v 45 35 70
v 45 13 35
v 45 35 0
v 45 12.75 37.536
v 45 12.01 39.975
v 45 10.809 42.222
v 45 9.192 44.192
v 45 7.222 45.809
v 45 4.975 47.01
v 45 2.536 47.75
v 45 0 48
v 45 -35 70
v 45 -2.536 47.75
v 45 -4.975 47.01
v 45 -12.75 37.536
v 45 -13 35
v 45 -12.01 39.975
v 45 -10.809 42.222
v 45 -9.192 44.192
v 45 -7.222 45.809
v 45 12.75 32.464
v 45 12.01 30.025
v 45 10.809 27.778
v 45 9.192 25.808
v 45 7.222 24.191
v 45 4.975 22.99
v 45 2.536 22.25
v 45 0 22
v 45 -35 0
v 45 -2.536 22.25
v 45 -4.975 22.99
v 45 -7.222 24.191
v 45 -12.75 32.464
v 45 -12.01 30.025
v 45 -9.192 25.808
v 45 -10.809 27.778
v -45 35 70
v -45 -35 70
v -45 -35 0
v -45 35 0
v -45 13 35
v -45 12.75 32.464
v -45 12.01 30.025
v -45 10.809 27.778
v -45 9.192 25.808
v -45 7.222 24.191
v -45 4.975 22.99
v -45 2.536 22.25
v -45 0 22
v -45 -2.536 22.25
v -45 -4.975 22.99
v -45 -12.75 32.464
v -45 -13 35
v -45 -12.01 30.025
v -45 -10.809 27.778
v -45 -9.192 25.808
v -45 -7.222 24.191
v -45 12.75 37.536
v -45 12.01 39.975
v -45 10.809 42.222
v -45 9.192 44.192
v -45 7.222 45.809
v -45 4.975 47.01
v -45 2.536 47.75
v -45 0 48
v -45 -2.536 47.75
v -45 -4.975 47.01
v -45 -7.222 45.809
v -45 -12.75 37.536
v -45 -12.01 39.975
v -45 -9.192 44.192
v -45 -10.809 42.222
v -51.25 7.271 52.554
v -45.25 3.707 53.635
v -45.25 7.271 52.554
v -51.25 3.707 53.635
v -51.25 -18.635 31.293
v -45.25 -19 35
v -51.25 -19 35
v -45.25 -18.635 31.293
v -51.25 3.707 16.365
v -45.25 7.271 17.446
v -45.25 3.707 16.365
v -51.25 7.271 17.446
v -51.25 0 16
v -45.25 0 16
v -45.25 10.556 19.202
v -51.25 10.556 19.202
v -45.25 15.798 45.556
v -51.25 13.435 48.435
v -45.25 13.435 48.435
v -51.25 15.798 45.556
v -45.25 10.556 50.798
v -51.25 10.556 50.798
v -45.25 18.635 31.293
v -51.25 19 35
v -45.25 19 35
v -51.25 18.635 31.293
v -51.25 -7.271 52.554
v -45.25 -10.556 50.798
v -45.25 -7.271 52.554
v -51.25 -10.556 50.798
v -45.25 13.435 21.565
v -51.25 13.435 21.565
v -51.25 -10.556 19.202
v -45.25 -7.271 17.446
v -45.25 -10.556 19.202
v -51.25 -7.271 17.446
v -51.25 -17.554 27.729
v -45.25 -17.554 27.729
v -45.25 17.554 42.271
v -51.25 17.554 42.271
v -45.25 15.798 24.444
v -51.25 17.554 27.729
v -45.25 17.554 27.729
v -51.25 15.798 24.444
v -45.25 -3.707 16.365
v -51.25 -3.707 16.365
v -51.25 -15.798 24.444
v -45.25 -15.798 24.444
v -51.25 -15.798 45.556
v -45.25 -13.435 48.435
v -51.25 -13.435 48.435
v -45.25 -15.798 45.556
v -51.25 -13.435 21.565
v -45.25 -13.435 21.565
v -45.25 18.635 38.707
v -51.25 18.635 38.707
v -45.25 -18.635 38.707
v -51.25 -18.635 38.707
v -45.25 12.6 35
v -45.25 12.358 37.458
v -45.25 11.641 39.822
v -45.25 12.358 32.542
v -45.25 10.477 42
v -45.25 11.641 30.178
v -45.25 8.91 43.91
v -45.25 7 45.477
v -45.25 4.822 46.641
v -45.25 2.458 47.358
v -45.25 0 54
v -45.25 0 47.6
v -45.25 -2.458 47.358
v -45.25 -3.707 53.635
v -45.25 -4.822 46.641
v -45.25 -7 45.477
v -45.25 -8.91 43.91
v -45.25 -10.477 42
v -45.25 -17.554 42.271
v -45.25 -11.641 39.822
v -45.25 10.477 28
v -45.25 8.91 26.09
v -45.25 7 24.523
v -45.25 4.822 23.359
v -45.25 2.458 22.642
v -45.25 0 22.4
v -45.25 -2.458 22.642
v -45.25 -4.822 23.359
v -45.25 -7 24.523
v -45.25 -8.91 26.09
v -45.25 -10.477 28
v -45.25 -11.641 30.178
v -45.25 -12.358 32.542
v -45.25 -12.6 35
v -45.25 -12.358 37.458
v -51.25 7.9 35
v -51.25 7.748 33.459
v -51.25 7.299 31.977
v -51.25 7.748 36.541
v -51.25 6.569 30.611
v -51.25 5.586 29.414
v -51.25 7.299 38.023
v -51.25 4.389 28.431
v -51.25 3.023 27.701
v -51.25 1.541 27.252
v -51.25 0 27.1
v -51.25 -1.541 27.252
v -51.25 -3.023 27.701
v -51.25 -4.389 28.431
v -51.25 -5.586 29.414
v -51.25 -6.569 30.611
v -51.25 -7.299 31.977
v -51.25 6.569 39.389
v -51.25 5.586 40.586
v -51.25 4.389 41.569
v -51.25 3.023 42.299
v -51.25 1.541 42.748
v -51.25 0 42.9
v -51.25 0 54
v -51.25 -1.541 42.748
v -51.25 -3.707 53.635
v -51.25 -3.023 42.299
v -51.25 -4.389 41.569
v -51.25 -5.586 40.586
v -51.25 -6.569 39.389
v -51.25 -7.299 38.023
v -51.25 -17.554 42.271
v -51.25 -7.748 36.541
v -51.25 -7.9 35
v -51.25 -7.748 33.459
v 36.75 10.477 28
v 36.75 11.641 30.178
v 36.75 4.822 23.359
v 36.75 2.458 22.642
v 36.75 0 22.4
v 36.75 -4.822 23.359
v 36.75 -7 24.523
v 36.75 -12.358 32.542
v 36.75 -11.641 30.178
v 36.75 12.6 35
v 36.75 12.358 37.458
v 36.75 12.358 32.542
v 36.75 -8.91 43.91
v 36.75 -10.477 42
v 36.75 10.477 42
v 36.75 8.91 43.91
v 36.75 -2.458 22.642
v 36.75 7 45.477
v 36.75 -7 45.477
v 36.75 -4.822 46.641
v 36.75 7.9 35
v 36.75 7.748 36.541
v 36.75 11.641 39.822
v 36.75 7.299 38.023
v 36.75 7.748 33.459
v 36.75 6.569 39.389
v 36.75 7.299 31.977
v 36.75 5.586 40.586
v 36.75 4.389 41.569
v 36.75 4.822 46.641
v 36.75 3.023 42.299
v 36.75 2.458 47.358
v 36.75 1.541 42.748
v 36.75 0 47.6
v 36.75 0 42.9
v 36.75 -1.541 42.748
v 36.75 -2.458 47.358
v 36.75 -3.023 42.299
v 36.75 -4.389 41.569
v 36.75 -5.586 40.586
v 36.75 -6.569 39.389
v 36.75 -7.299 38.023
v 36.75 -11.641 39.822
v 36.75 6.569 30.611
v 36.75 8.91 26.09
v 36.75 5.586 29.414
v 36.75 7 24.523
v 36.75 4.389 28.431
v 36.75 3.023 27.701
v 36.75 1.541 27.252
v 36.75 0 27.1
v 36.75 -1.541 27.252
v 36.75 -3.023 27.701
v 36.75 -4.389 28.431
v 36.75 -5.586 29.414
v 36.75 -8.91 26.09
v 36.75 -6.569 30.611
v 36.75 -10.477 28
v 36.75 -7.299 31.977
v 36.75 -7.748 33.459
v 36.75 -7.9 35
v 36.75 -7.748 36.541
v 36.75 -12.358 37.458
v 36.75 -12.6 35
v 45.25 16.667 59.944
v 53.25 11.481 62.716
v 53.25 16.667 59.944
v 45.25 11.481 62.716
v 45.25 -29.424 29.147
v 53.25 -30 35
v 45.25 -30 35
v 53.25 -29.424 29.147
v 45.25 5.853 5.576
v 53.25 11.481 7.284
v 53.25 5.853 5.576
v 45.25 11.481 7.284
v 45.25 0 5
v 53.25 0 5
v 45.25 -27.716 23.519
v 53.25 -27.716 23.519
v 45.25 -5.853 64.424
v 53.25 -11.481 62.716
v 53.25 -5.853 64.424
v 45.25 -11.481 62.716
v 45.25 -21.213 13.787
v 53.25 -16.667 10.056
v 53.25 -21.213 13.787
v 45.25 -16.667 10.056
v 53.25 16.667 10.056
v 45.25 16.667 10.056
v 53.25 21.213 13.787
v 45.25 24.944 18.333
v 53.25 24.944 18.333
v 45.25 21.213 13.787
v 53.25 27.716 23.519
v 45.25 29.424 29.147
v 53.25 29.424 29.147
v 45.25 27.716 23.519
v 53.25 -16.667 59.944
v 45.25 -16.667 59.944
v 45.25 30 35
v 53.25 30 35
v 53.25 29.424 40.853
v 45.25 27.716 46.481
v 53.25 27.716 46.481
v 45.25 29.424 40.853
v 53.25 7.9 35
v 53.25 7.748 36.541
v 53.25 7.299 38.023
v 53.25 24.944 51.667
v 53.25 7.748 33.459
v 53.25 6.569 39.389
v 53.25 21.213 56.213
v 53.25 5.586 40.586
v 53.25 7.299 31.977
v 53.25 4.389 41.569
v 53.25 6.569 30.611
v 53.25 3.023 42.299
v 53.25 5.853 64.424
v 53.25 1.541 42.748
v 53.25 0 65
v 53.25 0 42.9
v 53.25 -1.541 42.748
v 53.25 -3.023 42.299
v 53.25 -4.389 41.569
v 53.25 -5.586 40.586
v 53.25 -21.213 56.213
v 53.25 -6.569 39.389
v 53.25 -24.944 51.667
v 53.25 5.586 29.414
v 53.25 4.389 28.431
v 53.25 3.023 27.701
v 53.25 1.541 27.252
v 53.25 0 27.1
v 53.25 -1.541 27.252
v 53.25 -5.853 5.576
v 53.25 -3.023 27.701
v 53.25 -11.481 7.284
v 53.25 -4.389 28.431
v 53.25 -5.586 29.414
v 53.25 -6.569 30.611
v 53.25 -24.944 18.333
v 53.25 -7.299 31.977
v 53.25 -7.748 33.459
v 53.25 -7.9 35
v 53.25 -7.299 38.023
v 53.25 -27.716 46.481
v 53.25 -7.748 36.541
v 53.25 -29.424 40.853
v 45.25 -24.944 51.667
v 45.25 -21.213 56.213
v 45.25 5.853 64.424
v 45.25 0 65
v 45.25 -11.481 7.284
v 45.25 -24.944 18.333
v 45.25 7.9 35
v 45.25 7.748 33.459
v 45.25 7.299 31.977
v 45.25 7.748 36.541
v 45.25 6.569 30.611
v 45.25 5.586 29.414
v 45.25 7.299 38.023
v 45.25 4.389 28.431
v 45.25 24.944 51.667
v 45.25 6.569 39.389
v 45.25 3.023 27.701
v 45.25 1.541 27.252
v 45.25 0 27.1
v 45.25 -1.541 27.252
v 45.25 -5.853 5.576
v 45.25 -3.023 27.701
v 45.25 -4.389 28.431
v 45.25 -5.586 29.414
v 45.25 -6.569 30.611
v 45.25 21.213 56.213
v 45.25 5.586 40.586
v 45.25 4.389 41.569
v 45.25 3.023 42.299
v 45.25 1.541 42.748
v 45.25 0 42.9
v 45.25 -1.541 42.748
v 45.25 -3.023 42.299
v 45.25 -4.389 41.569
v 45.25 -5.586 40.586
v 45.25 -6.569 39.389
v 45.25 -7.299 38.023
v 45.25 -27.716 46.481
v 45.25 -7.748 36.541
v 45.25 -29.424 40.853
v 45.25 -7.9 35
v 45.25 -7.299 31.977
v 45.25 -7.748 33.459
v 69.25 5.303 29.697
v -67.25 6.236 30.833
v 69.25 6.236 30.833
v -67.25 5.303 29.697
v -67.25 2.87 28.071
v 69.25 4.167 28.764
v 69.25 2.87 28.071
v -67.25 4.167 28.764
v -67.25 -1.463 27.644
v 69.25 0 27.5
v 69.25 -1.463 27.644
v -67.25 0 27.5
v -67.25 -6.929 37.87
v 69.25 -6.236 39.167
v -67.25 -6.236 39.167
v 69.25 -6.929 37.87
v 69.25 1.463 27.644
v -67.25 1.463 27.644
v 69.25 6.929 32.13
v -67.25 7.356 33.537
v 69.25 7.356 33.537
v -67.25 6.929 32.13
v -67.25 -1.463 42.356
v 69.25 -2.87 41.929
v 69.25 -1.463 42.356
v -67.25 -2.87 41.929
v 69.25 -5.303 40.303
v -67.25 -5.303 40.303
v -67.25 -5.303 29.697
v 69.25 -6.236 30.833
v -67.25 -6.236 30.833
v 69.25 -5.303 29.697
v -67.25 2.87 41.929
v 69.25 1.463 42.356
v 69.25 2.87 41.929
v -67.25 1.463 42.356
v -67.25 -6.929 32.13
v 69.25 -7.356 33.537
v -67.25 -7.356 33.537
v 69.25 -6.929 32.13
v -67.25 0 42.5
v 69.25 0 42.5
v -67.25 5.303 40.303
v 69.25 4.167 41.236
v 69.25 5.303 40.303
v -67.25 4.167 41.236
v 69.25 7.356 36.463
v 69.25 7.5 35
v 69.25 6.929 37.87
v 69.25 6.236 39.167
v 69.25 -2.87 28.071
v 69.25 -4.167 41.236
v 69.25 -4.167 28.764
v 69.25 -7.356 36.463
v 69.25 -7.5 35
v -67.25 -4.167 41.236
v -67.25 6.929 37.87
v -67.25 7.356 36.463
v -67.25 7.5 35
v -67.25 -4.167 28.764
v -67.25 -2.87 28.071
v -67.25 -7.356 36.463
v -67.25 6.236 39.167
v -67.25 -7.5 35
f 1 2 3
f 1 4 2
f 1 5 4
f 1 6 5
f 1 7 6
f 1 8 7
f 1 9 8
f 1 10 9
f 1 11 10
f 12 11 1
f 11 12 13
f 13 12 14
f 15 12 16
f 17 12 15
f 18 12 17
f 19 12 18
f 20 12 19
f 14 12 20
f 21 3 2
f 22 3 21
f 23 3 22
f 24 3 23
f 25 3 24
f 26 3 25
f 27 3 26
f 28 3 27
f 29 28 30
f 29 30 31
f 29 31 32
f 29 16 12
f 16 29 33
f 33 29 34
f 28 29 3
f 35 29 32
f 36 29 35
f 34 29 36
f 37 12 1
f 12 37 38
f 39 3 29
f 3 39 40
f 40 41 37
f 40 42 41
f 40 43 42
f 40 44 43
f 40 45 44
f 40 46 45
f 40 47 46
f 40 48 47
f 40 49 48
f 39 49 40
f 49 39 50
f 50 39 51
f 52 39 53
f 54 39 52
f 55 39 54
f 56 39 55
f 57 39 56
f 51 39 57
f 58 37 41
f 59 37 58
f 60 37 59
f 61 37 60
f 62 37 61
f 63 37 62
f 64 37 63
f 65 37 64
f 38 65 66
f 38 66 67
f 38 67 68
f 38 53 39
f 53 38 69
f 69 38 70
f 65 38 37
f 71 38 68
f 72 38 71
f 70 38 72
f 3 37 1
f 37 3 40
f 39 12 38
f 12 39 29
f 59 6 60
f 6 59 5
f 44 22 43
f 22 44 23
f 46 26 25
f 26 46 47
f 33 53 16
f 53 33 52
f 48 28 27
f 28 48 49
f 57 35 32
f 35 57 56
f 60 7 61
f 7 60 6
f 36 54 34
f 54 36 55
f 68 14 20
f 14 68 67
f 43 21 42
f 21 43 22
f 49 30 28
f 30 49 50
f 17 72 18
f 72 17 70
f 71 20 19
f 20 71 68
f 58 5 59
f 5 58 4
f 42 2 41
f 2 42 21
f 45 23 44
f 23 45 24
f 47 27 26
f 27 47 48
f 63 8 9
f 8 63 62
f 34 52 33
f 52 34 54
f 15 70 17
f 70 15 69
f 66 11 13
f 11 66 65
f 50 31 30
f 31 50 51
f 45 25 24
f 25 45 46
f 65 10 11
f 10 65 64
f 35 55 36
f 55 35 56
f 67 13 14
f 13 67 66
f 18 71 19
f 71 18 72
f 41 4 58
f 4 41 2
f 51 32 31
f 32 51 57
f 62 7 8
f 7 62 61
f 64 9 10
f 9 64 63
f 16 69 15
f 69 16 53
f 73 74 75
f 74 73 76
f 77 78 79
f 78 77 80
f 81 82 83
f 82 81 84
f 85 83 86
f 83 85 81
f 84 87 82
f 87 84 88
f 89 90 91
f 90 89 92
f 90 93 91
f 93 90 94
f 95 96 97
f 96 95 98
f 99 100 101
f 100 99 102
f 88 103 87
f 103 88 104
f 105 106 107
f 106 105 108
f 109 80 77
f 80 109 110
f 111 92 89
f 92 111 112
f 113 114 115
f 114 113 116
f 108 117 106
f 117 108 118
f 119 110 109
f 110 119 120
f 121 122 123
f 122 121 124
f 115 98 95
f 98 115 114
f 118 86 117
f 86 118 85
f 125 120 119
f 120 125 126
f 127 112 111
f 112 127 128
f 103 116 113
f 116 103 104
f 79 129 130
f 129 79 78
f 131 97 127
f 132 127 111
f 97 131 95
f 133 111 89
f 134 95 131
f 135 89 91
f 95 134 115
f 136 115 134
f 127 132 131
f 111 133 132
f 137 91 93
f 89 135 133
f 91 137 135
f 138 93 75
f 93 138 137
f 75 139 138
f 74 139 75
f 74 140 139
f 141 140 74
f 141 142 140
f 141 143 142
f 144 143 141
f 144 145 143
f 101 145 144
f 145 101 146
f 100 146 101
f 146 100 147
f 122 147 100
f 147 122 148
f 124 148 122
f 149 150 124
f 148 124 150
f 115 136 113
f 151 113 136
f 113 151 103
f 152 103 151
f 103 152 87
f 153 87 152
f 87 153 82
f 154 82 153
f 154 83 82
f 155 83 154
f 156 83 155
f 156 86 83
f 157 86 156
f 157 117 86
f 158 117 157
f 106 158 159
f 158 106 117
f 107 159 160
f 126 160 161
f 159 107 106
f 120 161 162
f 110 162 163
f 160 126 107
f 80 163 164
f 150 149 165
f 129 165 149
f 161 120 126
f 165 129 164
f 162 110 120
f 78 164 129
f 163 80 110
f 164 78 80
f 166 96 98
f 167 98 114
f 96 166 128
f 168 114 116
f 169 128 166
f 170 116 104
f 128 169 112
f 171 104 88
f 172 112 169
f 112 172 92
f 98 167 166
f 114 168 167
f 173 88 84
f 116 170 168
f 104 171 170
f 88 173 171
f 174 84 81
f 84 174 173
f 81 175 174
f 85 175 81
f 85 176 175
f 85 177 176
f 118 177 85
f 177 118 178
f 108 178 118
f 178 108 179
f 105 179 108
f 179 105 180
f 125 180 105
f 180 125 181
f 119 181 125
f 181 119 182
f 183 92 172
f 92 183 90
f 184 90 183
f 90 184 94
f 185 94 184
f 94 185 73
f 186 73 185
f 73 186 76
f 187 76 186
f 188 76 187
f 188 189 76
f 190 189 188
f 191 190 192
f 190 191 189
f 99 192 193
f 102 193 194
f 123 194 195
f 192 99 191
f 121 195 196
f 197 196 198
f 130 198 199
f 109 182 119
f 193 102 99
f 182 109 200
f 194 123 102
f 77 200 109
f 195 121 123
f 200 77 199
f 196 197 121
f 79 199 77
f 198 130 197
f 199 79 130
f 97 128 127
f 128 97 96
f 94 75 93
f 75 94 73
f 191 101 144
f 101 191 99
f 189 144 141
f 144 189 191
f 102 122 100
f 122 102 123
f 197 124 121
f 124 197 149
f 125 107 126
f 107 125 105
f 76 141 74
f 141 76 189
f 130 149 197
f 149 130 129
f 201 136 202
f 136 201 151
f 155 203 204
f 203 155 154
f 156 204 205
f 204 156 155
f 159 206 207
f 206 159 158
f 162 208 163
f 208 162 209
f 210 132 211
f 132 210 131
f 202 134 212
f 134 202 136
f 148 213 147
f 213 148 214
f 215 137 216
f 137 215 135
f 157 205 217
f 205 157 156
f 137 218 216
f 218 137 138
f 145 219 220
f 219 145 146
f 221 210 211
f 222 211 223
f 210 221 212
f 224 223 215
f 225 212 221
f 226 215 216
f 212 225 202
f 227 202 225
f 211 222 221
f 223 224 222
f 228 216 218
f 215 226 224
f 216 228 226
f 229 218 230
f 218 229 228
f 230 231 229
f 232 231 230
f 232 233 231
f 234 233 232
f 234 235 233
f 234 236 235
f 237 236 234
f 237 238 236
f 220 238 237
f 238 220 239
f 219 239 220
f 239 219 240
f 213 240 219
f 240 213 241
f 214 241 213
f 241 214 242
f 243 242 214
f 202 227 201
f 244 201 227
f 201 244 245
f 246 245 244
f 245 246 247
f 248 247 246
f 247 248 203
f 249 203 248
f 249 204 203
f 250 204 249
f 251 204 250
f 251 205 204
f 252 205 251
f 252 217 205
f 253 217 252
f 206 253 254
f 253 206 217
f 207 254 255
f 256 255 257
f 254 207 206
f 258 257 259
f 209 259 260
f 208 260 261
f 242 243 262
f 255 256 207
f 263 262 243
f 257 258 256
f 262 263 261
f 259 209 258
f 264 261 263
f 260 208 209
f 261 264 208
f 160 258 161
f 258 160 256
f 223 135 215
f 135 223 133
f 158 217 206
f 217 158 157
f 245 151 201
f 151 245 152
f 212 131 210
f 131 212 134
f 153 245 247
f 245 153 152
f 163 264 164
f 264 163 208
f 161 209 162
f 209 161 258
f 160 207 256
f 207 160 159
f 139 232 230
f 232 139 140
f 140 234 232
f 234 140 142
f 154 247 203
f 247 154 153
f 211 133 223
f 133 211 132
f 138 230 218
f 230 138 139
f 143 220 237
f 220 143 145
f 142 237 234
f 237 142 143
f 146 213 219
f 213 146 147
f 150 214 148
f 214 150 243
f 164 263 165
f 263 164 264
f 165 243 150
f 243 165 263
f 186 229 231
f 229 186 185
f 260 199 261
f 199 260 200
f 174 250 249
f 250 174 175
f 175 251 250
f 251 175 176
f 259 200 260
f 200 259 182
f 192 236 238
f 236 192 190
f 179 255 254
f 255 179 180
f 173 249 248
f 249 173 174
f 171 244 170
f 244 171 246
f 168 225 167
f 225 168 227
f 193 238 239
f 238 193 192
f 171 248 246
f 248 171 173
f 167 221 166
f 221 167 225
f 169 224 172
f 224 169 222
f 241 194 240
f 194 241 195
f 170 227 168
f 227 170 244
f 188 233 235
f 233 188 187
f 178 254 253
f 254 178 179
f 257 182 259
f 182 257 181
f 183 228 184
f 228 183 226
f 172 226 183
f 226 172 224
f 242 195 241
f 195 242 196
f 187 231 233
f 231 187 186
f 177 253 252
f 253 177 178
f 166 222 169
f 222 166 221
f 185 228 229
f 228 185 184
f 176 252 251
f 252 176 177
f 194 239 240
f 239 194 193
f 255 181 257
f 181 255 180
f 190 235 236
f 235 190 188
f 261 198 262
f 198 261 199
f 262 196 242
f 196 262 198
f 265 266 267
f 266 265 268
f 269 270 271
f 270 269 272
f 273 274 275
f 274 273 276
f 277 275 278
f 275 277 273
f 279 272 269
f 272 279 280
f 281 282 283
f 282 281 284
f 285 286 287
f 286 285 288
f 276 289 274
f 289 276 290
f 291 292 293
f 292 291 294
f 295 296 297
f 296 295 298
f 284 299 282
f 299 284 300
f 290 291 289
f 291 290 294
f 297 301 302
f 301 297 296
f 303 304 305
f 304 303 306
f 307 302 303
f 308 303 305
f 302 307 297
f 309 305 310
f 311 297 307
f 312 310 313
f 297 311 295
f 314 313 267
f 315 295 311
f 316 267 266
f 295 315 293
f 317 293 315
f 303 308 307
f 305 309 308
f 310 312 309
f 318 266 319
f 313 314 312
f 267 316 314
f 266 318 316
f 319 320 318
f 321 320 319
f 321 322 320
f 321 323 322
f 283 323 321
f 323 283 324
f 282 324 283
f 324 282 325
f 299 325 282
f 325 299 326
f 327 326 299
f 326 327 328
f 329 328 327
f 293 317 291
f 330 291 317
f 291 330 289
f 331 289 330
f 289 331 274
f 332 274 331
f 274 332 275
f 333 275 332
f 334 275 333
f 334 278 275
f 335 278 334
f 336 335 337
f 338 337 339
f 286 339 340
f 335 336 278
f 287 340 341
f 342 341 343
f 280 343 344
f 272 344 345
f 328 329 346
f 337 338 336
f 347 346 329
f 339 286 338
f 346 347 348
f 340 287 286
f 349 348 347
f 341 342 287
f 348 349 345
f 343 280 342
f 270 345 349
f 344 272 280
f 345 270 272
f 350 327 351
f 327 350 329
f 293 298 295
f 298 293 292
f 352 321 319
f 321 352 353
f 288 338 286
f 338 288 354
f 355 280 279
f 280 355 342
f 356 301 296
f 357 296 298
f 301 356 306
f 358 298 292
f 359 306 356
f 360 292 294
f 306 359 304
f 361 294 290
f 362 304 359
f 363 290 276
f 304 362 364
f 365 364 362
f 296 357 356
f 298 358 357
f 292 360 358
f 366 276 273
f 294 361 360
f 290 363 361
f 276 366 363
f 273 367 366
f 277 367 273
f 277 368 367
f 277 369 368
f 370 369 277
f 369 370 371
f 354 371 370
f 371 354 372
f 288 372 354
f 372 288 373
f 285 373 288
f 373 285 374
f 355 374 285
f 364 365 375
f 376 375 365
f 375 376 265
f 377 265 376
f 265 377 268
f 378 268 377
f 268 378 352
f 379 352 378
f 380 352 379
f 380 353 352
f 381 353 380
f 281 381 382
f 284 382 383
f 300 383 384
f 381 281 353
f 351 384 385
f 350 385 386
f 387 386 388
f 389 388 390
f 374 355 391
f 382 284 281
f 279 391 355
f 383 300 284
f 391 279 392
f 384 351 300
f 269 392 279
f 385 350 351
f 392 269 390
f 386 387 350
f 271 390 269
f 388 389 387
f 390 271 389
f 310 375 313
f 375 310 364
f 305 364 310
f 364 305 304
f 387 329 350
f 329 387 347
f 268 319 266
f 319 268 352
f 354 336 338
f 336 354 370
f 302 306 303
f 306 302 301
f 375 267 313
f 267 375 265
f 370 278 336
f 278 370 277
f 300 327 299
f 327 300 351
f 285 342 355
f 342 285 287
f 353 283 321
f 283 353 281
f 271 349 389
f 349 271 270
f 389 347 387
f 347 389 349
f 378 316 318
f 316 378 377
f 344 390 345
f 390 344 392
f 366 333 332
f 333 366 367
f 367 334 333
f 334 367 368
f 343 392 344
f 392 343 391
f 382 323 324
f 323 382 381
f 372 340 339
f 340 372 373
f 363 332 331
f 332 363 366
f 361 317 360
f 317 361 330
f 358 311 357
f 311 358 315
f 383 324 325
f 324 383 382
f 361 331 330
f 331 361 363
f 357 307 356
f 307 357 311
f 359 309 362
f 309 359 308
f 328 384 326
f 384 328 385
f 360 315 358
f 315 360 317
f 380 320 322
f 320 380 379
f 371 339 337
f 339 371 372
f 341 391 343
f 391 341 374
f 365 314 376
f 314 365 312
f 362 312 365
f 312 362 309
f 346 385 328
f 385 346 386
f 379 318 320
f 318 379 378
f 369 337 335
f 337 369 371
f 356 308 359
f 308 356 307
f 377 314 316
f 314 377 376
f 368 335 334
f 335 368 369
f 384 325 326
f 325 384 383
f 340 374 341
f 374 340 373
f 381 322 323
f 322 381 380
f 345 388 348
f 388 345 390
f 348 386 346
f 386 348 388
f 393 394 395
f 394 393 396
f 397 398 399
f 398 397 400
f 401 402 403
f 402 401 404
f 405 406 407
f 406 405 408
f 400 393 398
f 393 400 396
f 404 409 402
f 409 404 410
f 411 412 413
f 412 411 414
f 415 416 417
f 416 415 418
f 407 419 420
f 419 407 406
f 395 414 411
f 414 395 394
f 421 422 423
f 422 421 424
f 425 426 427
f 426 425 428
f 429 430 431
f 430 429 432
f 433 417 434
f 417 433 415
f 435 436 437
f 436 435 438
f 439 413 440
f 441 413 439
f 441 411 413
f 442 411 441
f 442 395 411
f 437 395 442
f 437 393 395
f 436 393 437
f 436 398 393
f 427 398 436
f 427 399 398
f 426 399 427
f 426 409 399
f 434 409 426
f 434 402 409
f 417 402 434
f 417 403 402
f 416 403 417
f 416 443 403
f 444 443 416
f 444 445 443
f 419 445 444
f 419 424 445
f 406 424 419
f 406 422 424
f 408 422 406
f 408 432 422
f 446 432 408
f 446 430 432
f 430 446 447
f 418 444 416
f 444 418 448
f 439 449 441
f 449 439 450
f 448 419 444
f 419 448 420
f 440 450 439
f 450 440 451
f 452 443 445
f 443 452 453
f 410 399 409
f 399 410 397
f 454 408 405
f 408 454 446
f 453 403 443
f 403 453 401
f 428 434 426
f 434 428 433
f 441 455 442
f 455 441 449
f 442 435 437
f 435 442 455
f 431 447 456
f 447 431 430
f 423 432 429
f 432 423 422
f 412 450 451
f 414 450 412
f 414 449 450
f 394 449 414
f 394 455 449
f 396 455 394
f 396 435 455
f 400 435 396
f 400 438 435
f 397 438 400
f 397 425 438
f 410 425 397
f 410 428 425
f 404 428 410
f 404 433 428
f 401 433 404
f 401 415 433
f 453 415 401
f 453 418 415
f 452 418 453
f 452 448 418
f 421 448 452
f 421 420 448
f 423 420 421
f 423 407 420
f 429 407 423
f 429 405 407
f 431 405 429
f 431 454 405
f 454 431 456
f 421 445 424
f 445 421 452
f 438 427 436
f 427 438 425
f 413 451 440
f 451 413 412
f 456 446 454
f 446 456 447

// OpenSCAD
$fn = 32;

// ------------------------------------------------------------------------
// Bushed housing: 90 x 70 x 70 mm housing, bushing d25.2
// Every part is its own module, assembly() places them once.
// ------------------------------------------------------------------------

// --- part 1 ---
module housing() {
  difference() {
    translate([-45, -35, 0]) cube([90, 70, 70]);
    translate([0, 0, 35]) rotate([0, 90, 0]) cylinder(h = 92, d = 26, center = true);
  }
}

// --- part 2 ---
module bushing() {
  difference() {
    union() {
      cylinder(h = 6, d = 38);
      translate([0, 0, 6]) cylinder(h = 82, d = 25.2);
    }
    translate([0, 0, -1]) cylinder(h = 90, d = 15.8);
  }
}

// --- part 3 ---
module shaft() {
  translate([0, 0, -68.25]) cylinder(h = 136.5, d = 15);
}

// --- part 4 ---
module cover() {
  difference() {
    cylinder(h = 8, d = 60);
    translate([0, 0, -1]) cylinder(h = 10, d = 15.8);
  }
}

// --- assembly ---
module assembly() {
  translate([0, 0, 0]) rotate([0, 0, 0]) housing();
  translate([-51.25, 0, 35]) rotate([0, 90, 0]) bushing();
  translate([1, 0, 35]) rotate([0, 90, 0]) shaft();
  translate([45.25, 0, 35]) rotate([0, 90, 0]) cover();
}

assembly();
